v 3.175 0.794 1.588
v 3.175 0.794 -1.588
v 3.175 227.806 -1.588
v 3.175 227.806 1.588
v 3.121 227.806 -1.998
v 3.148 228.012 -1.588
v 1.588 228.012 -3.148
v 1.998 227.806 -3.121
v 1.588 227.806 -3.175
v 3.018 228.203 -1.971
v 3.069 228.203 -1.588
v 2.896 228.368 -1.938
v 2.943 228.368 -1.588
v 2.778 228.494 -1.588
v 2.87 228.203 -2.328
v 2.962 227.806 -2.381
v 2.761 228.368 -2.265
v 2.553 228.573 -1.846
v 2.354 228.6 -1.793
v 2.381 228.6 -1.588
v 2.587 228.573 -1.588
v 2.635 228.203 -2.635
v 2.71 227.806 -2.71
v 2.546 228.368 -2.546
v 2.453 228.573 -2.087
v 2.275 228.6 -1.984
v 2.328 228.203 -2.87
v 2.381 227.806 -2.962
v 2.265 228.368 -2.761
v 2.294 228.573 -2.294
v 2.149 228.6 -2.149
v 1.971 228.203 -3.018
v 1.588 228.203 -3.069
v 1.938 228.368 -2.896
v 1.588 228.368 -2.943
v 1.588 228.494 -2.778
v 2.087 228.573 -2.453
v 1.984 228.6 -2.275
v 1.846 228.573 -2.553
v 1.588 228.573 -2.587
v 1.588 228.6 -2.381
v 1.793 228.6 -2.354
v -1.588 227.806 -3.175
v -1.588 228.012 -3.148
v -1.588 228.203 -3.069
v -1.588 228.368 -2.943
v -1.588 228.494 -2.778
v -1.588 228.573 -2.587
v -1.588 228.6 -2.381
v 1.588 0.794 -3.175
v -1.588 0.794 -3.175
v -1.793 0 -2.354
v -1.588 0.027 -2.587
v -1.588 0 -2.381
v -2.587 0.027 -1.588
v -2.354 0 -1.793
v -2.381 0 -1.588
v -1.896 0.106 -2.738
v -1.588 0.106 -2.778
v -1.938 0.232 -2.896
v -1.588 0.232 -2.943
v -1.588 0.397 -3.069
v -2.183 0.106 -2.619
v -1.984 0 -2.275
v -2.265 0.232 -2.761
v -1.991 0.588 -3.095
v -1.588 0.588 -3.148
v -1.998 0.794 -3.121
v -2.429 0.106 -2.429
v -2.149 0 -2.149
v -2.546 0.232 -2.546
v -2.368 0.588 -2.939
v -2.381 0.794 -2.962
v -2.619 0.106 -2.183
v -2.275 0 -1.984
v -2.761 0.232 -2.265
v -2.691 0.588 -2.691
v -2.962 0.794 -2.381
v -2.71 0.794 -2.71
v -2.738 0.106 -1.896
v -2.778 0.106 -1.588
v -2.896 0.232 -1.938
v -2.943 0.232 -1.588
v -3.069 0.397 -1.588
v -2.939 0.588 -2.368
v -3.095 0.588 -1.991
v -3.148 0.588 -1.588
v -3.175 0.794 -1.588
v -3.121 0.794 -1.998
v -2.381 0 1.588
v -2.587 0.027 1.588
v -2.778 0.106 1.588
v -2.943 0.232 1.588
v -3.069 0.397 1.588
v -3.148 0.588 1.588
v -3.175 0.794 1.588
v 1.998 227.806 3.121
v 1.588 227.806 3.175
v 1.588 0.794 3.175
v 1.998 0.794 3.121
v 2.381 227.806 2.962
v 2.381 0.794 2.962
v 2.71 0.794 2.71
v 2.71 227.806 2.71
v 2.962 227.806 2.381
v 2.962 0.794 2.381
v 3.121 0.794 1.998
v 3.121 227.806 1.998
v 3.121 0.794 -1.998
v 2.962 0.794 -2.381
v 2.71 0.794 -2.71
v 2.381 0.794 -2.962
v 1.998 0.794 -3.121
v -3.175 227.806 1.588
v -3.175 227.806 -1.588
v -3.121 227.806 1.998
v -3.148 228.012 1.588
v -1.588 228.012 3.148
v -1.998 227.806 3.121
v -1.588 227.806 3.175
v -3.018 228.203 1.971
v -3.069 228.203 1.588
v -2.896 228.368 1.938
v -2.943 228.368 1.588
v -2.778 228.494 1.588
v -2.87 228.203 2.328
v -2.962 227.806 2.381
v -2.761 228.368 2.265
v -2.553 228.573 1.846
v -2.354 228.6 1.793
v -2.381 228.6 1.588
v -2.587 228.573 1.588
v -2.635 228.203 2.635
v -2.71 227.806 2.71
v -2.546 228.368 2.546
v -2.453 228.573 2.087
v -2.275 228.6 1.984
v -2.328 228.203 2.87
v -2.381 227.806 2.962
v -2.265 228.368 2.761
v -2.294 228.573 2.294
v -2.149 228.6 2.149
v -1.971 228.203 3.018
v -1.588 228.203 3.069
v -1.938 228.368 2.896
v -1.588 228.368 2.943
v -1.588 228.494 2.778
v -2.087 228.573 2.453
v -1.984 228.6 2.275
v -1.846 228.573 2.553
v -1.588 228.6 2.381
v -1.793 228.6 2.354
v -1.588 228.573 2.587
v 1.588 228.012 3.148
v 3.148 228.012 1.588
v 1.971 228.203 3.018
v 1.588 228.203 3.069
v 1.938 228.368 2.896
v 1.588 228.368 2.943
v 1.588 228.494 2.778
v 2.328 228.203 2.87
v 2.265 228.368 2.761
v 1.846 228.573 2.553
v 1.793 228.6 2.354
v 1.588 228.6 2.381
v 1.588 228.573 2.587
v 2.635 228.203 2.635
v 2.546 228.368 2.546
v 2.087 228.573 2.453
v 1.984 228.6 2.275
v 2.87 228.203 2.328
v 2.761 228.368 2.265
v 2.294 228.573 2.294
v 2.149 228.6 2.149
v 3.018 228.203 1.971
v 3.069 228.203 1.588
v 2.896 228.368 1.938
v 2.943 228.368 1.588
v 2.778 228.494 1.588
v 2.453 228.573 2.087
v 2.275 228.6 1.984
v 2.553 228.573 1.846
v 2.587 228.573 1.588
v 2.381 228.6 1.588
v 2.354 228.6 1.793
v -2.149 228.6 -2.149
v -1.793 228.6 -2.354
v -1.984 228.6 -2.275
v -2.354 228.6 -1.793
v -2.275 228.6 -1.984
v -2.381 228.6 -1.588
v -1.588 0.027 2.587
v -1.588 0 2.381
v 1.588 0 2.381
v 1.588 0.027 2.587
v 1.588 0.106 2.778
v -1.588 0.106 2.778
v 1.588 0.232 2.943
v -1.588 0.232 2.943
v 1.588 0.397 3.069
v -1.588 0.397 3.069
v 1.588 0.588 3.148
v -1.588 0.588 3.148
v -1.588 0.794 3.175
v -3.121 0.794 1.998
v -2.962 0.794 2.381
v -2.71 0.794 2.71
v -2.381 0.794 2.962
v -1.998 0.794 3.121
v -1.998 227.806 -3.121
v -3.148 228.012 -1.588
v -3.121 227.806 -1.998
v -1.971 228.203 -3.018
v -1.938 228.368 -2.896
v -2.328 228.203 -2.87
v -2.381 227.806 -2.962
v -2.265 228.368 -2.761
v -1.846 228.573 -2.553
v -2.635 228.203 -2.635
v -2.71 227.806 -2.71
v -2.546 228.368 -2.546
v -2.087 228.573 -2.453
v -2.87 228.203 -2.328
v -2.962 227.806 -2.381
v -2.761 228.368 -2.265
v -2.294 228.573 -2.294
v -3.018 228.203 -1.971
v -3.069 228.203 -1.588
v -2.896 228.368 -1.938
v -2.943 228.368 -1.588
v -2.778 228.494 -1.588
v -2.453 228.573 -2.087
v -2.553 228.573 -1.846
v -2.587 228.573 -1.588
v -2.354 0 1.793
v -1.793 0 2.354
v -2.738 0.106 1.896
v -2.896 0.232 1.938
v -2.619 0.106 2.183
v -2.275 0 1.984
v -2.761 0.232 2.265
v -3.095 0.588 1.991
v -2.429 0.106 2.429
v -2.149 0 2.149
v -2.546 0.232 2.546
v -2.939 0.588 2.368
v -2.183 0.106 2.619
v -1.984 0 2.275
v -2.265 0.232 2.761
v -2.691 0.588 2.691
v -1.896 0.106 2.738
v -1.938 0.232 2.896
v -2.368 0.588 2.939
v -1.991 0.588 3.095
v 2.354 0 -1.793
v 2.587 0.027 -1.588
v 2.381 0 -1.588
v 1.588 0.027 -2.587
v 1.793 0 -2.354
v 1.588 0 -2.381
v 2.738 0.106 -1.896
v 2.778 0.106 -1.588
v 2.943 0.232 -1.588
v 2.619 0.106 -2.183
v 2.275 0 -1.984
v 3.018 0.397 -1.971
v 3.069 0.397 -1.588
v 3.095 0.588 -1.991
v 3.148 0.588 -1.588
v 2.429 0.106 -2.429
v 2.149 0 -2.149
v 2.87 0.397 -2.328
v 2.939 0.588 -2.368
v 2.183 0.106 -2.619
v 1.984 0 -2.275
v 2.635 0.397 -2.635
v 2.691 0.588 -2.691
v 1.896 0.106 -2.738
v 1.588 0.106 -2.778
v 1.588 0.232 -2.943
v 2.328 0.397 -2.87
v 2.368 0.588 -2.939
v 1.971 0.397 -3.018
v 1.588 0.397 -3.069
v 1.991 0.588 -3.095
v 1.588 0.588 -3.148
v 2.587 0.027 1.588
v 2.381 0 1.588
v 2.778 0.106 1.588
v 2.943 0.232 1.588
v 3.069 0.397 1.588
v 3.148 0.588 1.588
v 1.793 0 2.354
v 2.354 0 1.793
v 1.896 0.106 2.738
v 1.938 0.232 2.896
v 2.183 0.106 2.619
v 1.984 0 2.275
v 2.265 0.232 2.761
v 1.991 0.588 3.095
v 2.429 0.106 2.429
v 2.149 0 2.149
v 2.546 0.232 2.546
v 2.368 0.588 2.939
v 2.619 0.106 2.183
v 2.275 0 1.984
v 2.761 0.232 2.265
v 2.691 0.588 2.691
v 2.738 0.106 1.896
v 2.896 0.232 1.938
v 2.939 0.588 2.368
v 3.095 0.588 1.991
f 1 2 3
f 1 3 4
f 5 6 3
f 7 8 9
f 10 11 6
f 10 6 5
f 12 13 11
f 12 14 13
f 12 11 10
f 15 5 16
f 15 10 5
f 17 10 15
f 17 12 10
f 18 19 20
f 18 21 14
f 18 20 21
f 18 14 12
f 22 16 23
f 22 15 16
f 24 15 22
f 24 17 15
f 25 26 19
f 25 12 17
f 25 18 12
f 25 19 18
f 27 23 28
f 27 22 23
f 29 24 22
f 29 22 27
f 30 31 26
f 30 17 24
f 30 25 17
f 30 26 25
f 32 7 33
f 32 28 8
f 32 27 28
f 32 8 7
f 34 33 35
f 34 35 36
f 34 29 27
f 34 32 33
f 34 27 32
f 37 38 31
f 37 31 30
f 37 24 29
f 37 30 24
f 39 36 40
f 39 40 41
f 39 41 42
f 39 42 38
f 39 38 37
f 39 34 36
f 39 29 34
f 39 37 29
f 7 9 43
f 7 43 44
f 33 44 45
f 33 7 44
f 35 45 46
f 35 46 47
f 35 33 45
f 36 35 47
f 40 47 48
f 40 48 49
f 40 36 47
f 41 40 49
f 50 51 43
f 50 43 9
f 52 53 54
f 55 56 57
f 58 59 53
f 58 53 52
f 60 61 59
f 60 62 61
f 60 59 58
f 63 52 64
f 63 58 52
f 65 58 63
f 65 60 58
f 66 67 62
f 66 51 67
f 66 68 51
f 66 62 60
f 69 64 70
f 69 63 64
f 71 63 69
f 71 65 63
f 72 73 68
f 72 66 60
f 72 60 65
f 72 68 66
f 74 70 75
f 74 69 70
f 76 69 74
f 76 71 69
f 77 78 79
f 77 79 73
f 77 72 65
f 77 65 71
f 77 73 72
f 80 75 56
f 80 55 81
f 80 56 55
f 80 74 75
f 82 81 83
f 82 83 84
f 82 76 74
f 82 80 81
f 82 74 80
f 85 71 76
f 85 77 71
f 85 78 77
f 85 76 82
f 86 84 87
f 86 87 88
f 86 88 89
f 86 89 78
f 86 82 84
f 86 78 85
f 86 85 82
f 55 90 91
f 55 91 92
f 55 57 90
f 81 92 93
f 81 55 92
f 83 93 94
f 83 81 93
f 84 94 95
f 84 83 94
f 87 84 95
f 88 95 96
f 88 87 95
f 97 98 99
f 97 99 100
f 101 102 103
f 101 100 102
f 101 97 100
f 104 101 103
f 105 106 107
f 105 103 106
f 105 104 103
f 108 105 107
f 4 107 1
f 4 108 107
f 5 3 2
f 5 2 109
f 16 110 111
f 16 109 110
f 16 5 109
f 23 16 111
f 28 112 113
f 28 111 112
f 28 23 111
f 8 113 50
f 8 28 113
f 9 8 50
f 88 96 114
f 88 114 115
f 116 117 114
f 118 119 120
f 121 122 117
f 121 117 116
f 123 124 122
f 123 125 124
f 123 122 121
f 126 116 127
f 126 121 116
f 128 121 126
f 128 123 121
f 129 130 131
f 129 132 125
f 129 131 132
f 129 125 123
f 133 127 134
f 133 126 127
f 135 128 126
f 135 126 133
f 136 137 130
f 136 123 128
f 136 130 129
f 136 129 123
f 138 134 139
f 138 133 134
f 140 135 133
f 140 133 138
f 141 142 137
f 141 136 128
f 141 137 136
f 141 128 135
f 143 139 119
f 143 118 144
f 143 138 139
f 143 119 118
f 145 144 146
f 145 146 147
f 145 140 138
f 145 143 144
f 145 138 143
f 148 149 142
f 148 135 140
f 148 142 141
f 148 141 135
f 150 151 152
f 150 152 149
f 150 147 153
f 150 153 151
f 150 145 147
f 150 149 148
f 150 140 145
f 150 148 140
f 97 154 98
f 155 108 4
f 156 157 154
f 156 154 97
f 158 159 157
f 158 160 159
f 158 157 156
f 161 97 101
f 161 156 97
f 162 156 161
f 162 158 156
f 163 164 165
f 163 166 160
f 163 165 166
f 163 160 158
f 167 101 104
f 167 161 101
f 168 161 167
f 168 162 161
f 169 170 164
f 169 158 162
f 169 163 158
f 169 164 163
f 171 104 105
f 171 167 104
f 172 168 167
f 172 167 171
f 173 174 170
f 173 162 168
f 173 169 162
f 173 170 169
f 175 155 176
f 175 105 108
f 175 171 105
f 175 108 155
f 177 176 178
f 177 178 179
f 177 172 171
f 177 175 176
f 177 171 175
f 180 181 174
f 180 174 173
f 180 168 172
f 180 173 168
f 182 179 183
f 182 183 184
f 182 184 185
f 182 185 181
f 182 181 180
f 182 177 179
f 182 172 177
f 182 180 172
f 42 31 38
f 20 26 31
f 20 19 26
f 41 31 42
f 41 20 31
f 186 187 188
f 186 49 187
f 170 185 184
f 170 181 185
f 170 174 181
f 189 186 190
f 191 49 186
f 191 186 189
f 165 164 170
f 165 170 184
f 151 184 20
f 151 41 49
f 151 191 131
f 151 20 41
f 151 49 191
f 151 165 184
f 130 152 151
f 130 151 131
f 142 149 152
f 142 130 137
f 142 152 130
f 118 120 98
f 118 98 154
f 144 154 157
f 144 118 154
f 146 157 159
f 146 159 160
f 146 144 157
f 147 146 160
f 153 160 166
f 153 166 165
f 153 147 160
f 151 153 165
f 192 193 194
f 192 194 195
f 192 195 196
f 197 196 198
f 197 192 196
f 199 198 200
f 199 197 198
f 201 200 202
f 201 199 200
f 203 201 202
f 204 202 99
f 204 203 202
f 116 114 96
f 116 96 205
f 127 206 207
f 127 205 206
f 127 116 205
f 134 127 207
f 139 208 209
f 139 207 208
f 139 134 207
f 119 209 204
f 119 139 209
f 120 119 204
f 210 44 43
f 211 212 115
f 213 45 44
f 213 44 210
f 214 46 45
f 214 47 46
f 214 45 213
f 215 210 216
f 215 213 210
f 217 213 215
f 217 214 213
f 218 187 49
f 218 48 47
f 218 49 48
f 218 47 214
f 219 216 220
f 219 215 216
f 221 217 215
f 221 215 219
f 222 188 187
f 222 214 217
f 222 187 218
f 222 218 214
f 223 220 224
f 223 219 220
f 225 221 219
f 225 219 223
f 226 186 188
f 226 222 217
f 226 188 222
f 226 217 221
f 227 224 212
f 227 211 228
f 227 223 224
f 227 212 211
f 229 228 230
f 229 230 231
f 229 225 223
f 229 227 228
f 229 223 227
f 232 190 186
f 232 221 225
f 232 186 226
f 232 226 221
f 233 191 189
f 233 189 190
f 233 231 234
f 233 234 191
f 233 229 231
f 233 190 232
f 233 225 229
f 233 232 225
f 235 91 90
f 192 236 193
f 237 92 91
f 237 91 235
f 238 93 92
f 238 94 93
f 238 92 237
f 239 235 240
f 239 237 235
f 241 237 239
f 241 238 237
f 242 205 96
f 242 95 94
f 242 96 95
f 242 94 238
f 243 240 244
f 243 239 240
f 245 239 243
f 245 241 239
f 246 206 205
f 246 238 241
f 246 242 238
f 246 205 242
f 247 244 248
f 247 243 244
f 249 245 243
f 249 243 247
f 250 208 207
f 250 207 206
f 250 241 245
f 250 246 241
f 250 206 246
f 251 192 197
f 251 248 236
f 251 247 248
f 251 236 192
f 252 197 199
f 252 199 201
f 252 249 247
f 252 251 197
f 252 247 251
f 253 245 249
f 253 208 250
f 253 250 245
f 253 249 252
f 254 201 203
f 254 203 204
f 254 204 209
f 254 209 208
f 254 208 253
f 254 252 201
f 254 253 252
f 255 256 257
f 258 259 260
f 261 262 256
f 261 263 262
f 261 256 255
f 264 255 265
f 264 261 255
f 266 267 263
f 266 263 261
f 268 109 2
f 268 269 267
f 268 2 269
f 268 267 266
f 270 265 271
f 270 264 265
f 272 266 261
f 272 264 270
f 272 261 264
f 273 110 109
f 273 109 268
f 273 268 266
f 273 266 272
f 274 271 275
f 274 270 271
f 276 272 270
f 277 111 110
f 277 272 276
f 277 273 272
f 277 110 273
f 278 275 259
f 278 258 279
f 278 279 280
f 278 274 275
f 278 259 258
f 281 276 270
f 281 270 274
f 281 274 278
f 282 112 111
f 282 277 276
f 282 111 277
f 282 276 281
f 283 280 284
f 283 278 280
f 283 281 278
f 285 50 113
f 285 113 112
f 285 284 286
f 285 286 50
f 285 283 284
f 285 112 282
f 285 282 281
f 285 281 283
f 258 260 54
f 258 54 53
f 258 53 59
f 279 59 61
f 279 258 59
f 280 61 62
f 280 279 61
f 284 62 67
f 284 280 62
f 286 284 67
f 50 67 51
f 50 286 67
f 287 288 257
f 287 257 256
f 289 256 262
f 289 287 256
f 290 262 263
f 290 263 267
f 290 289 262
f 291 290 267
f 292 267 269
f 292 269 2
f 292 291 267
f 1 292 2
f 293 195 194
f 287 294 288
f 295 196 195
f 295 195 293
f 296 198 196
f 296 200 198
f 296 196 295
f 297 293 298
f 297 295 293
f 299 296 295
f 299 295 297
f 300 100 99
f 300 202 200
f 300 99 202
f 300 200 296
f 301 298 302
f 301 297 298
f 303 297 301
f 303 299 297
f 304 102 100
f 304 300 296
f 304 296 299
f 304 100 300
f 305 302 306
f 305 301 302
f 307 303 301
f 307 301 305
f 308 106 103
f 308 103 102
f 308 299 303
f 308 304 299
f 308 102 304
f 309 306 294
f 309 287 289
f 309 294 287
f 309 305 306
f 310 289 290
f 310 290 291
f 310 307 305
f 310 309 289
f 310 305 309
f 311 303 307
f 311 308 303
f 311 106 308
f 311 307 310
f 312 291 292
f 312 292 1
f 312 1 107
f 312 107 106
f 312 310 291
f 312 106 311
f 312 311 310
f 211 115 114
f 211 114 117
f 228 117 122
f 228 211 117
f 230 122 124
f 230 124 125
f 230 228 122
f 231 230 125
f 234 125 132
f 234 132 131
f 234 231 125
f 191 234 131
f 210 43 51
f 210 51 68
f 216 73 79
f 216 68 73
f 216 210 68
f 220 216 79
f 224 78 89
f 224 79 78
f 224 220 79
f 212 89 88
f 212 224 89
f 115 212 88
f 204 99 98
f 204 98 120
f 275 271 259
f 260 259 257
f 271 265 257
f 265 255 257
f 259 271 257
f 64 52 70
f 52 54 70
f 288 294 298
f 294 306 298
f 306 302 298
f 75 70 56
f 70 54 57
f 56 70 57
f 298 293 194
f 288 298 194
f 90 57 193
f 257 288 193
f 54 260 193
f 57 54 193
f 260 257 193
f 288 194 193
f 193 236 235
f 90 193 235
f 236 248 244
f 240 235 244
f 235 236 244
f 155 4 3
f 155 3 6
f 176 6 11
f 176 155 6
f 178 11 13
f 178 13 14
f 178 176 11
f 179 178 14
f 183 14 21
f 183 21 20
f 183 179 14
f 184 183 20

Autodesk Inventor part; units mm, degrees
ref_plane "YZ Plane" through (0, 0, 0) normal (1, 0, 0) x (0, 1, 0)
ref_plane "XZ Plane" through (0, 0, 0) normal (0, 1, 0) x (-1, 0, 0)
ref_plane "XY Plane" through (0, 0, 0) normal (0, 0, 1) x (1, 0, 0)
sketch "Sketch1" plane through (0, 0, 0) normal (0, 1, 0) x (-1, 0, 0)
  line L0 (-3.175, 3.175) -> (3.175, 3.175)
  line L1 (3.175, 3.175) -> (3.175, -3.175)
  line L2 (3.175, -3.175) -> (-3.175, -3.175)
  line L3 (-3.175, -3.175) -> (-3.175, 3.175)
  line L4 (-3.175, 3.175) -> (3.175, -3.175) construction
  line L5 (3.175, 3.175) -> (-3.175, -3.175) construction
  point P0 (0, 0)
  dimension "d0" = 6.35
  dimension "d1" = 6.35
extrude "Extrusion1" add sketch "Sketch1" along normal blind 228.6
fillet "Fillet1" radius 1.5875 4 edges at (3.175, 114.3, -3.175) (3.175, 114.3, 3.175) (-3.175, 114.3, 3.175) (-3.175, 114.3, -3.175)
fillet "Fillet2" radius 0.7937 16 edges at (3.175, 0, 0) (2.71, 0, -2.71) (0, 0, -3.175) (-2.71, 0, -2.71) (-3.175, 0, 0) (-2.71, 0, 2.71) (0, 0, 3.175) (2.71, 0, 2.71) (0, 228.6, 3.175) (-2.71, 228.6, 2.71) (-3.175, 228.6, 0) (-2.71, 228.6, -2.71) (0, 228.6, -3.175) (2.71, 228.6, -2.71) (3.175, 228.6, 0) (2.71, 228.6, 2.71)
properties part number "9 inch hs shaft" material "Stainless Steel"
